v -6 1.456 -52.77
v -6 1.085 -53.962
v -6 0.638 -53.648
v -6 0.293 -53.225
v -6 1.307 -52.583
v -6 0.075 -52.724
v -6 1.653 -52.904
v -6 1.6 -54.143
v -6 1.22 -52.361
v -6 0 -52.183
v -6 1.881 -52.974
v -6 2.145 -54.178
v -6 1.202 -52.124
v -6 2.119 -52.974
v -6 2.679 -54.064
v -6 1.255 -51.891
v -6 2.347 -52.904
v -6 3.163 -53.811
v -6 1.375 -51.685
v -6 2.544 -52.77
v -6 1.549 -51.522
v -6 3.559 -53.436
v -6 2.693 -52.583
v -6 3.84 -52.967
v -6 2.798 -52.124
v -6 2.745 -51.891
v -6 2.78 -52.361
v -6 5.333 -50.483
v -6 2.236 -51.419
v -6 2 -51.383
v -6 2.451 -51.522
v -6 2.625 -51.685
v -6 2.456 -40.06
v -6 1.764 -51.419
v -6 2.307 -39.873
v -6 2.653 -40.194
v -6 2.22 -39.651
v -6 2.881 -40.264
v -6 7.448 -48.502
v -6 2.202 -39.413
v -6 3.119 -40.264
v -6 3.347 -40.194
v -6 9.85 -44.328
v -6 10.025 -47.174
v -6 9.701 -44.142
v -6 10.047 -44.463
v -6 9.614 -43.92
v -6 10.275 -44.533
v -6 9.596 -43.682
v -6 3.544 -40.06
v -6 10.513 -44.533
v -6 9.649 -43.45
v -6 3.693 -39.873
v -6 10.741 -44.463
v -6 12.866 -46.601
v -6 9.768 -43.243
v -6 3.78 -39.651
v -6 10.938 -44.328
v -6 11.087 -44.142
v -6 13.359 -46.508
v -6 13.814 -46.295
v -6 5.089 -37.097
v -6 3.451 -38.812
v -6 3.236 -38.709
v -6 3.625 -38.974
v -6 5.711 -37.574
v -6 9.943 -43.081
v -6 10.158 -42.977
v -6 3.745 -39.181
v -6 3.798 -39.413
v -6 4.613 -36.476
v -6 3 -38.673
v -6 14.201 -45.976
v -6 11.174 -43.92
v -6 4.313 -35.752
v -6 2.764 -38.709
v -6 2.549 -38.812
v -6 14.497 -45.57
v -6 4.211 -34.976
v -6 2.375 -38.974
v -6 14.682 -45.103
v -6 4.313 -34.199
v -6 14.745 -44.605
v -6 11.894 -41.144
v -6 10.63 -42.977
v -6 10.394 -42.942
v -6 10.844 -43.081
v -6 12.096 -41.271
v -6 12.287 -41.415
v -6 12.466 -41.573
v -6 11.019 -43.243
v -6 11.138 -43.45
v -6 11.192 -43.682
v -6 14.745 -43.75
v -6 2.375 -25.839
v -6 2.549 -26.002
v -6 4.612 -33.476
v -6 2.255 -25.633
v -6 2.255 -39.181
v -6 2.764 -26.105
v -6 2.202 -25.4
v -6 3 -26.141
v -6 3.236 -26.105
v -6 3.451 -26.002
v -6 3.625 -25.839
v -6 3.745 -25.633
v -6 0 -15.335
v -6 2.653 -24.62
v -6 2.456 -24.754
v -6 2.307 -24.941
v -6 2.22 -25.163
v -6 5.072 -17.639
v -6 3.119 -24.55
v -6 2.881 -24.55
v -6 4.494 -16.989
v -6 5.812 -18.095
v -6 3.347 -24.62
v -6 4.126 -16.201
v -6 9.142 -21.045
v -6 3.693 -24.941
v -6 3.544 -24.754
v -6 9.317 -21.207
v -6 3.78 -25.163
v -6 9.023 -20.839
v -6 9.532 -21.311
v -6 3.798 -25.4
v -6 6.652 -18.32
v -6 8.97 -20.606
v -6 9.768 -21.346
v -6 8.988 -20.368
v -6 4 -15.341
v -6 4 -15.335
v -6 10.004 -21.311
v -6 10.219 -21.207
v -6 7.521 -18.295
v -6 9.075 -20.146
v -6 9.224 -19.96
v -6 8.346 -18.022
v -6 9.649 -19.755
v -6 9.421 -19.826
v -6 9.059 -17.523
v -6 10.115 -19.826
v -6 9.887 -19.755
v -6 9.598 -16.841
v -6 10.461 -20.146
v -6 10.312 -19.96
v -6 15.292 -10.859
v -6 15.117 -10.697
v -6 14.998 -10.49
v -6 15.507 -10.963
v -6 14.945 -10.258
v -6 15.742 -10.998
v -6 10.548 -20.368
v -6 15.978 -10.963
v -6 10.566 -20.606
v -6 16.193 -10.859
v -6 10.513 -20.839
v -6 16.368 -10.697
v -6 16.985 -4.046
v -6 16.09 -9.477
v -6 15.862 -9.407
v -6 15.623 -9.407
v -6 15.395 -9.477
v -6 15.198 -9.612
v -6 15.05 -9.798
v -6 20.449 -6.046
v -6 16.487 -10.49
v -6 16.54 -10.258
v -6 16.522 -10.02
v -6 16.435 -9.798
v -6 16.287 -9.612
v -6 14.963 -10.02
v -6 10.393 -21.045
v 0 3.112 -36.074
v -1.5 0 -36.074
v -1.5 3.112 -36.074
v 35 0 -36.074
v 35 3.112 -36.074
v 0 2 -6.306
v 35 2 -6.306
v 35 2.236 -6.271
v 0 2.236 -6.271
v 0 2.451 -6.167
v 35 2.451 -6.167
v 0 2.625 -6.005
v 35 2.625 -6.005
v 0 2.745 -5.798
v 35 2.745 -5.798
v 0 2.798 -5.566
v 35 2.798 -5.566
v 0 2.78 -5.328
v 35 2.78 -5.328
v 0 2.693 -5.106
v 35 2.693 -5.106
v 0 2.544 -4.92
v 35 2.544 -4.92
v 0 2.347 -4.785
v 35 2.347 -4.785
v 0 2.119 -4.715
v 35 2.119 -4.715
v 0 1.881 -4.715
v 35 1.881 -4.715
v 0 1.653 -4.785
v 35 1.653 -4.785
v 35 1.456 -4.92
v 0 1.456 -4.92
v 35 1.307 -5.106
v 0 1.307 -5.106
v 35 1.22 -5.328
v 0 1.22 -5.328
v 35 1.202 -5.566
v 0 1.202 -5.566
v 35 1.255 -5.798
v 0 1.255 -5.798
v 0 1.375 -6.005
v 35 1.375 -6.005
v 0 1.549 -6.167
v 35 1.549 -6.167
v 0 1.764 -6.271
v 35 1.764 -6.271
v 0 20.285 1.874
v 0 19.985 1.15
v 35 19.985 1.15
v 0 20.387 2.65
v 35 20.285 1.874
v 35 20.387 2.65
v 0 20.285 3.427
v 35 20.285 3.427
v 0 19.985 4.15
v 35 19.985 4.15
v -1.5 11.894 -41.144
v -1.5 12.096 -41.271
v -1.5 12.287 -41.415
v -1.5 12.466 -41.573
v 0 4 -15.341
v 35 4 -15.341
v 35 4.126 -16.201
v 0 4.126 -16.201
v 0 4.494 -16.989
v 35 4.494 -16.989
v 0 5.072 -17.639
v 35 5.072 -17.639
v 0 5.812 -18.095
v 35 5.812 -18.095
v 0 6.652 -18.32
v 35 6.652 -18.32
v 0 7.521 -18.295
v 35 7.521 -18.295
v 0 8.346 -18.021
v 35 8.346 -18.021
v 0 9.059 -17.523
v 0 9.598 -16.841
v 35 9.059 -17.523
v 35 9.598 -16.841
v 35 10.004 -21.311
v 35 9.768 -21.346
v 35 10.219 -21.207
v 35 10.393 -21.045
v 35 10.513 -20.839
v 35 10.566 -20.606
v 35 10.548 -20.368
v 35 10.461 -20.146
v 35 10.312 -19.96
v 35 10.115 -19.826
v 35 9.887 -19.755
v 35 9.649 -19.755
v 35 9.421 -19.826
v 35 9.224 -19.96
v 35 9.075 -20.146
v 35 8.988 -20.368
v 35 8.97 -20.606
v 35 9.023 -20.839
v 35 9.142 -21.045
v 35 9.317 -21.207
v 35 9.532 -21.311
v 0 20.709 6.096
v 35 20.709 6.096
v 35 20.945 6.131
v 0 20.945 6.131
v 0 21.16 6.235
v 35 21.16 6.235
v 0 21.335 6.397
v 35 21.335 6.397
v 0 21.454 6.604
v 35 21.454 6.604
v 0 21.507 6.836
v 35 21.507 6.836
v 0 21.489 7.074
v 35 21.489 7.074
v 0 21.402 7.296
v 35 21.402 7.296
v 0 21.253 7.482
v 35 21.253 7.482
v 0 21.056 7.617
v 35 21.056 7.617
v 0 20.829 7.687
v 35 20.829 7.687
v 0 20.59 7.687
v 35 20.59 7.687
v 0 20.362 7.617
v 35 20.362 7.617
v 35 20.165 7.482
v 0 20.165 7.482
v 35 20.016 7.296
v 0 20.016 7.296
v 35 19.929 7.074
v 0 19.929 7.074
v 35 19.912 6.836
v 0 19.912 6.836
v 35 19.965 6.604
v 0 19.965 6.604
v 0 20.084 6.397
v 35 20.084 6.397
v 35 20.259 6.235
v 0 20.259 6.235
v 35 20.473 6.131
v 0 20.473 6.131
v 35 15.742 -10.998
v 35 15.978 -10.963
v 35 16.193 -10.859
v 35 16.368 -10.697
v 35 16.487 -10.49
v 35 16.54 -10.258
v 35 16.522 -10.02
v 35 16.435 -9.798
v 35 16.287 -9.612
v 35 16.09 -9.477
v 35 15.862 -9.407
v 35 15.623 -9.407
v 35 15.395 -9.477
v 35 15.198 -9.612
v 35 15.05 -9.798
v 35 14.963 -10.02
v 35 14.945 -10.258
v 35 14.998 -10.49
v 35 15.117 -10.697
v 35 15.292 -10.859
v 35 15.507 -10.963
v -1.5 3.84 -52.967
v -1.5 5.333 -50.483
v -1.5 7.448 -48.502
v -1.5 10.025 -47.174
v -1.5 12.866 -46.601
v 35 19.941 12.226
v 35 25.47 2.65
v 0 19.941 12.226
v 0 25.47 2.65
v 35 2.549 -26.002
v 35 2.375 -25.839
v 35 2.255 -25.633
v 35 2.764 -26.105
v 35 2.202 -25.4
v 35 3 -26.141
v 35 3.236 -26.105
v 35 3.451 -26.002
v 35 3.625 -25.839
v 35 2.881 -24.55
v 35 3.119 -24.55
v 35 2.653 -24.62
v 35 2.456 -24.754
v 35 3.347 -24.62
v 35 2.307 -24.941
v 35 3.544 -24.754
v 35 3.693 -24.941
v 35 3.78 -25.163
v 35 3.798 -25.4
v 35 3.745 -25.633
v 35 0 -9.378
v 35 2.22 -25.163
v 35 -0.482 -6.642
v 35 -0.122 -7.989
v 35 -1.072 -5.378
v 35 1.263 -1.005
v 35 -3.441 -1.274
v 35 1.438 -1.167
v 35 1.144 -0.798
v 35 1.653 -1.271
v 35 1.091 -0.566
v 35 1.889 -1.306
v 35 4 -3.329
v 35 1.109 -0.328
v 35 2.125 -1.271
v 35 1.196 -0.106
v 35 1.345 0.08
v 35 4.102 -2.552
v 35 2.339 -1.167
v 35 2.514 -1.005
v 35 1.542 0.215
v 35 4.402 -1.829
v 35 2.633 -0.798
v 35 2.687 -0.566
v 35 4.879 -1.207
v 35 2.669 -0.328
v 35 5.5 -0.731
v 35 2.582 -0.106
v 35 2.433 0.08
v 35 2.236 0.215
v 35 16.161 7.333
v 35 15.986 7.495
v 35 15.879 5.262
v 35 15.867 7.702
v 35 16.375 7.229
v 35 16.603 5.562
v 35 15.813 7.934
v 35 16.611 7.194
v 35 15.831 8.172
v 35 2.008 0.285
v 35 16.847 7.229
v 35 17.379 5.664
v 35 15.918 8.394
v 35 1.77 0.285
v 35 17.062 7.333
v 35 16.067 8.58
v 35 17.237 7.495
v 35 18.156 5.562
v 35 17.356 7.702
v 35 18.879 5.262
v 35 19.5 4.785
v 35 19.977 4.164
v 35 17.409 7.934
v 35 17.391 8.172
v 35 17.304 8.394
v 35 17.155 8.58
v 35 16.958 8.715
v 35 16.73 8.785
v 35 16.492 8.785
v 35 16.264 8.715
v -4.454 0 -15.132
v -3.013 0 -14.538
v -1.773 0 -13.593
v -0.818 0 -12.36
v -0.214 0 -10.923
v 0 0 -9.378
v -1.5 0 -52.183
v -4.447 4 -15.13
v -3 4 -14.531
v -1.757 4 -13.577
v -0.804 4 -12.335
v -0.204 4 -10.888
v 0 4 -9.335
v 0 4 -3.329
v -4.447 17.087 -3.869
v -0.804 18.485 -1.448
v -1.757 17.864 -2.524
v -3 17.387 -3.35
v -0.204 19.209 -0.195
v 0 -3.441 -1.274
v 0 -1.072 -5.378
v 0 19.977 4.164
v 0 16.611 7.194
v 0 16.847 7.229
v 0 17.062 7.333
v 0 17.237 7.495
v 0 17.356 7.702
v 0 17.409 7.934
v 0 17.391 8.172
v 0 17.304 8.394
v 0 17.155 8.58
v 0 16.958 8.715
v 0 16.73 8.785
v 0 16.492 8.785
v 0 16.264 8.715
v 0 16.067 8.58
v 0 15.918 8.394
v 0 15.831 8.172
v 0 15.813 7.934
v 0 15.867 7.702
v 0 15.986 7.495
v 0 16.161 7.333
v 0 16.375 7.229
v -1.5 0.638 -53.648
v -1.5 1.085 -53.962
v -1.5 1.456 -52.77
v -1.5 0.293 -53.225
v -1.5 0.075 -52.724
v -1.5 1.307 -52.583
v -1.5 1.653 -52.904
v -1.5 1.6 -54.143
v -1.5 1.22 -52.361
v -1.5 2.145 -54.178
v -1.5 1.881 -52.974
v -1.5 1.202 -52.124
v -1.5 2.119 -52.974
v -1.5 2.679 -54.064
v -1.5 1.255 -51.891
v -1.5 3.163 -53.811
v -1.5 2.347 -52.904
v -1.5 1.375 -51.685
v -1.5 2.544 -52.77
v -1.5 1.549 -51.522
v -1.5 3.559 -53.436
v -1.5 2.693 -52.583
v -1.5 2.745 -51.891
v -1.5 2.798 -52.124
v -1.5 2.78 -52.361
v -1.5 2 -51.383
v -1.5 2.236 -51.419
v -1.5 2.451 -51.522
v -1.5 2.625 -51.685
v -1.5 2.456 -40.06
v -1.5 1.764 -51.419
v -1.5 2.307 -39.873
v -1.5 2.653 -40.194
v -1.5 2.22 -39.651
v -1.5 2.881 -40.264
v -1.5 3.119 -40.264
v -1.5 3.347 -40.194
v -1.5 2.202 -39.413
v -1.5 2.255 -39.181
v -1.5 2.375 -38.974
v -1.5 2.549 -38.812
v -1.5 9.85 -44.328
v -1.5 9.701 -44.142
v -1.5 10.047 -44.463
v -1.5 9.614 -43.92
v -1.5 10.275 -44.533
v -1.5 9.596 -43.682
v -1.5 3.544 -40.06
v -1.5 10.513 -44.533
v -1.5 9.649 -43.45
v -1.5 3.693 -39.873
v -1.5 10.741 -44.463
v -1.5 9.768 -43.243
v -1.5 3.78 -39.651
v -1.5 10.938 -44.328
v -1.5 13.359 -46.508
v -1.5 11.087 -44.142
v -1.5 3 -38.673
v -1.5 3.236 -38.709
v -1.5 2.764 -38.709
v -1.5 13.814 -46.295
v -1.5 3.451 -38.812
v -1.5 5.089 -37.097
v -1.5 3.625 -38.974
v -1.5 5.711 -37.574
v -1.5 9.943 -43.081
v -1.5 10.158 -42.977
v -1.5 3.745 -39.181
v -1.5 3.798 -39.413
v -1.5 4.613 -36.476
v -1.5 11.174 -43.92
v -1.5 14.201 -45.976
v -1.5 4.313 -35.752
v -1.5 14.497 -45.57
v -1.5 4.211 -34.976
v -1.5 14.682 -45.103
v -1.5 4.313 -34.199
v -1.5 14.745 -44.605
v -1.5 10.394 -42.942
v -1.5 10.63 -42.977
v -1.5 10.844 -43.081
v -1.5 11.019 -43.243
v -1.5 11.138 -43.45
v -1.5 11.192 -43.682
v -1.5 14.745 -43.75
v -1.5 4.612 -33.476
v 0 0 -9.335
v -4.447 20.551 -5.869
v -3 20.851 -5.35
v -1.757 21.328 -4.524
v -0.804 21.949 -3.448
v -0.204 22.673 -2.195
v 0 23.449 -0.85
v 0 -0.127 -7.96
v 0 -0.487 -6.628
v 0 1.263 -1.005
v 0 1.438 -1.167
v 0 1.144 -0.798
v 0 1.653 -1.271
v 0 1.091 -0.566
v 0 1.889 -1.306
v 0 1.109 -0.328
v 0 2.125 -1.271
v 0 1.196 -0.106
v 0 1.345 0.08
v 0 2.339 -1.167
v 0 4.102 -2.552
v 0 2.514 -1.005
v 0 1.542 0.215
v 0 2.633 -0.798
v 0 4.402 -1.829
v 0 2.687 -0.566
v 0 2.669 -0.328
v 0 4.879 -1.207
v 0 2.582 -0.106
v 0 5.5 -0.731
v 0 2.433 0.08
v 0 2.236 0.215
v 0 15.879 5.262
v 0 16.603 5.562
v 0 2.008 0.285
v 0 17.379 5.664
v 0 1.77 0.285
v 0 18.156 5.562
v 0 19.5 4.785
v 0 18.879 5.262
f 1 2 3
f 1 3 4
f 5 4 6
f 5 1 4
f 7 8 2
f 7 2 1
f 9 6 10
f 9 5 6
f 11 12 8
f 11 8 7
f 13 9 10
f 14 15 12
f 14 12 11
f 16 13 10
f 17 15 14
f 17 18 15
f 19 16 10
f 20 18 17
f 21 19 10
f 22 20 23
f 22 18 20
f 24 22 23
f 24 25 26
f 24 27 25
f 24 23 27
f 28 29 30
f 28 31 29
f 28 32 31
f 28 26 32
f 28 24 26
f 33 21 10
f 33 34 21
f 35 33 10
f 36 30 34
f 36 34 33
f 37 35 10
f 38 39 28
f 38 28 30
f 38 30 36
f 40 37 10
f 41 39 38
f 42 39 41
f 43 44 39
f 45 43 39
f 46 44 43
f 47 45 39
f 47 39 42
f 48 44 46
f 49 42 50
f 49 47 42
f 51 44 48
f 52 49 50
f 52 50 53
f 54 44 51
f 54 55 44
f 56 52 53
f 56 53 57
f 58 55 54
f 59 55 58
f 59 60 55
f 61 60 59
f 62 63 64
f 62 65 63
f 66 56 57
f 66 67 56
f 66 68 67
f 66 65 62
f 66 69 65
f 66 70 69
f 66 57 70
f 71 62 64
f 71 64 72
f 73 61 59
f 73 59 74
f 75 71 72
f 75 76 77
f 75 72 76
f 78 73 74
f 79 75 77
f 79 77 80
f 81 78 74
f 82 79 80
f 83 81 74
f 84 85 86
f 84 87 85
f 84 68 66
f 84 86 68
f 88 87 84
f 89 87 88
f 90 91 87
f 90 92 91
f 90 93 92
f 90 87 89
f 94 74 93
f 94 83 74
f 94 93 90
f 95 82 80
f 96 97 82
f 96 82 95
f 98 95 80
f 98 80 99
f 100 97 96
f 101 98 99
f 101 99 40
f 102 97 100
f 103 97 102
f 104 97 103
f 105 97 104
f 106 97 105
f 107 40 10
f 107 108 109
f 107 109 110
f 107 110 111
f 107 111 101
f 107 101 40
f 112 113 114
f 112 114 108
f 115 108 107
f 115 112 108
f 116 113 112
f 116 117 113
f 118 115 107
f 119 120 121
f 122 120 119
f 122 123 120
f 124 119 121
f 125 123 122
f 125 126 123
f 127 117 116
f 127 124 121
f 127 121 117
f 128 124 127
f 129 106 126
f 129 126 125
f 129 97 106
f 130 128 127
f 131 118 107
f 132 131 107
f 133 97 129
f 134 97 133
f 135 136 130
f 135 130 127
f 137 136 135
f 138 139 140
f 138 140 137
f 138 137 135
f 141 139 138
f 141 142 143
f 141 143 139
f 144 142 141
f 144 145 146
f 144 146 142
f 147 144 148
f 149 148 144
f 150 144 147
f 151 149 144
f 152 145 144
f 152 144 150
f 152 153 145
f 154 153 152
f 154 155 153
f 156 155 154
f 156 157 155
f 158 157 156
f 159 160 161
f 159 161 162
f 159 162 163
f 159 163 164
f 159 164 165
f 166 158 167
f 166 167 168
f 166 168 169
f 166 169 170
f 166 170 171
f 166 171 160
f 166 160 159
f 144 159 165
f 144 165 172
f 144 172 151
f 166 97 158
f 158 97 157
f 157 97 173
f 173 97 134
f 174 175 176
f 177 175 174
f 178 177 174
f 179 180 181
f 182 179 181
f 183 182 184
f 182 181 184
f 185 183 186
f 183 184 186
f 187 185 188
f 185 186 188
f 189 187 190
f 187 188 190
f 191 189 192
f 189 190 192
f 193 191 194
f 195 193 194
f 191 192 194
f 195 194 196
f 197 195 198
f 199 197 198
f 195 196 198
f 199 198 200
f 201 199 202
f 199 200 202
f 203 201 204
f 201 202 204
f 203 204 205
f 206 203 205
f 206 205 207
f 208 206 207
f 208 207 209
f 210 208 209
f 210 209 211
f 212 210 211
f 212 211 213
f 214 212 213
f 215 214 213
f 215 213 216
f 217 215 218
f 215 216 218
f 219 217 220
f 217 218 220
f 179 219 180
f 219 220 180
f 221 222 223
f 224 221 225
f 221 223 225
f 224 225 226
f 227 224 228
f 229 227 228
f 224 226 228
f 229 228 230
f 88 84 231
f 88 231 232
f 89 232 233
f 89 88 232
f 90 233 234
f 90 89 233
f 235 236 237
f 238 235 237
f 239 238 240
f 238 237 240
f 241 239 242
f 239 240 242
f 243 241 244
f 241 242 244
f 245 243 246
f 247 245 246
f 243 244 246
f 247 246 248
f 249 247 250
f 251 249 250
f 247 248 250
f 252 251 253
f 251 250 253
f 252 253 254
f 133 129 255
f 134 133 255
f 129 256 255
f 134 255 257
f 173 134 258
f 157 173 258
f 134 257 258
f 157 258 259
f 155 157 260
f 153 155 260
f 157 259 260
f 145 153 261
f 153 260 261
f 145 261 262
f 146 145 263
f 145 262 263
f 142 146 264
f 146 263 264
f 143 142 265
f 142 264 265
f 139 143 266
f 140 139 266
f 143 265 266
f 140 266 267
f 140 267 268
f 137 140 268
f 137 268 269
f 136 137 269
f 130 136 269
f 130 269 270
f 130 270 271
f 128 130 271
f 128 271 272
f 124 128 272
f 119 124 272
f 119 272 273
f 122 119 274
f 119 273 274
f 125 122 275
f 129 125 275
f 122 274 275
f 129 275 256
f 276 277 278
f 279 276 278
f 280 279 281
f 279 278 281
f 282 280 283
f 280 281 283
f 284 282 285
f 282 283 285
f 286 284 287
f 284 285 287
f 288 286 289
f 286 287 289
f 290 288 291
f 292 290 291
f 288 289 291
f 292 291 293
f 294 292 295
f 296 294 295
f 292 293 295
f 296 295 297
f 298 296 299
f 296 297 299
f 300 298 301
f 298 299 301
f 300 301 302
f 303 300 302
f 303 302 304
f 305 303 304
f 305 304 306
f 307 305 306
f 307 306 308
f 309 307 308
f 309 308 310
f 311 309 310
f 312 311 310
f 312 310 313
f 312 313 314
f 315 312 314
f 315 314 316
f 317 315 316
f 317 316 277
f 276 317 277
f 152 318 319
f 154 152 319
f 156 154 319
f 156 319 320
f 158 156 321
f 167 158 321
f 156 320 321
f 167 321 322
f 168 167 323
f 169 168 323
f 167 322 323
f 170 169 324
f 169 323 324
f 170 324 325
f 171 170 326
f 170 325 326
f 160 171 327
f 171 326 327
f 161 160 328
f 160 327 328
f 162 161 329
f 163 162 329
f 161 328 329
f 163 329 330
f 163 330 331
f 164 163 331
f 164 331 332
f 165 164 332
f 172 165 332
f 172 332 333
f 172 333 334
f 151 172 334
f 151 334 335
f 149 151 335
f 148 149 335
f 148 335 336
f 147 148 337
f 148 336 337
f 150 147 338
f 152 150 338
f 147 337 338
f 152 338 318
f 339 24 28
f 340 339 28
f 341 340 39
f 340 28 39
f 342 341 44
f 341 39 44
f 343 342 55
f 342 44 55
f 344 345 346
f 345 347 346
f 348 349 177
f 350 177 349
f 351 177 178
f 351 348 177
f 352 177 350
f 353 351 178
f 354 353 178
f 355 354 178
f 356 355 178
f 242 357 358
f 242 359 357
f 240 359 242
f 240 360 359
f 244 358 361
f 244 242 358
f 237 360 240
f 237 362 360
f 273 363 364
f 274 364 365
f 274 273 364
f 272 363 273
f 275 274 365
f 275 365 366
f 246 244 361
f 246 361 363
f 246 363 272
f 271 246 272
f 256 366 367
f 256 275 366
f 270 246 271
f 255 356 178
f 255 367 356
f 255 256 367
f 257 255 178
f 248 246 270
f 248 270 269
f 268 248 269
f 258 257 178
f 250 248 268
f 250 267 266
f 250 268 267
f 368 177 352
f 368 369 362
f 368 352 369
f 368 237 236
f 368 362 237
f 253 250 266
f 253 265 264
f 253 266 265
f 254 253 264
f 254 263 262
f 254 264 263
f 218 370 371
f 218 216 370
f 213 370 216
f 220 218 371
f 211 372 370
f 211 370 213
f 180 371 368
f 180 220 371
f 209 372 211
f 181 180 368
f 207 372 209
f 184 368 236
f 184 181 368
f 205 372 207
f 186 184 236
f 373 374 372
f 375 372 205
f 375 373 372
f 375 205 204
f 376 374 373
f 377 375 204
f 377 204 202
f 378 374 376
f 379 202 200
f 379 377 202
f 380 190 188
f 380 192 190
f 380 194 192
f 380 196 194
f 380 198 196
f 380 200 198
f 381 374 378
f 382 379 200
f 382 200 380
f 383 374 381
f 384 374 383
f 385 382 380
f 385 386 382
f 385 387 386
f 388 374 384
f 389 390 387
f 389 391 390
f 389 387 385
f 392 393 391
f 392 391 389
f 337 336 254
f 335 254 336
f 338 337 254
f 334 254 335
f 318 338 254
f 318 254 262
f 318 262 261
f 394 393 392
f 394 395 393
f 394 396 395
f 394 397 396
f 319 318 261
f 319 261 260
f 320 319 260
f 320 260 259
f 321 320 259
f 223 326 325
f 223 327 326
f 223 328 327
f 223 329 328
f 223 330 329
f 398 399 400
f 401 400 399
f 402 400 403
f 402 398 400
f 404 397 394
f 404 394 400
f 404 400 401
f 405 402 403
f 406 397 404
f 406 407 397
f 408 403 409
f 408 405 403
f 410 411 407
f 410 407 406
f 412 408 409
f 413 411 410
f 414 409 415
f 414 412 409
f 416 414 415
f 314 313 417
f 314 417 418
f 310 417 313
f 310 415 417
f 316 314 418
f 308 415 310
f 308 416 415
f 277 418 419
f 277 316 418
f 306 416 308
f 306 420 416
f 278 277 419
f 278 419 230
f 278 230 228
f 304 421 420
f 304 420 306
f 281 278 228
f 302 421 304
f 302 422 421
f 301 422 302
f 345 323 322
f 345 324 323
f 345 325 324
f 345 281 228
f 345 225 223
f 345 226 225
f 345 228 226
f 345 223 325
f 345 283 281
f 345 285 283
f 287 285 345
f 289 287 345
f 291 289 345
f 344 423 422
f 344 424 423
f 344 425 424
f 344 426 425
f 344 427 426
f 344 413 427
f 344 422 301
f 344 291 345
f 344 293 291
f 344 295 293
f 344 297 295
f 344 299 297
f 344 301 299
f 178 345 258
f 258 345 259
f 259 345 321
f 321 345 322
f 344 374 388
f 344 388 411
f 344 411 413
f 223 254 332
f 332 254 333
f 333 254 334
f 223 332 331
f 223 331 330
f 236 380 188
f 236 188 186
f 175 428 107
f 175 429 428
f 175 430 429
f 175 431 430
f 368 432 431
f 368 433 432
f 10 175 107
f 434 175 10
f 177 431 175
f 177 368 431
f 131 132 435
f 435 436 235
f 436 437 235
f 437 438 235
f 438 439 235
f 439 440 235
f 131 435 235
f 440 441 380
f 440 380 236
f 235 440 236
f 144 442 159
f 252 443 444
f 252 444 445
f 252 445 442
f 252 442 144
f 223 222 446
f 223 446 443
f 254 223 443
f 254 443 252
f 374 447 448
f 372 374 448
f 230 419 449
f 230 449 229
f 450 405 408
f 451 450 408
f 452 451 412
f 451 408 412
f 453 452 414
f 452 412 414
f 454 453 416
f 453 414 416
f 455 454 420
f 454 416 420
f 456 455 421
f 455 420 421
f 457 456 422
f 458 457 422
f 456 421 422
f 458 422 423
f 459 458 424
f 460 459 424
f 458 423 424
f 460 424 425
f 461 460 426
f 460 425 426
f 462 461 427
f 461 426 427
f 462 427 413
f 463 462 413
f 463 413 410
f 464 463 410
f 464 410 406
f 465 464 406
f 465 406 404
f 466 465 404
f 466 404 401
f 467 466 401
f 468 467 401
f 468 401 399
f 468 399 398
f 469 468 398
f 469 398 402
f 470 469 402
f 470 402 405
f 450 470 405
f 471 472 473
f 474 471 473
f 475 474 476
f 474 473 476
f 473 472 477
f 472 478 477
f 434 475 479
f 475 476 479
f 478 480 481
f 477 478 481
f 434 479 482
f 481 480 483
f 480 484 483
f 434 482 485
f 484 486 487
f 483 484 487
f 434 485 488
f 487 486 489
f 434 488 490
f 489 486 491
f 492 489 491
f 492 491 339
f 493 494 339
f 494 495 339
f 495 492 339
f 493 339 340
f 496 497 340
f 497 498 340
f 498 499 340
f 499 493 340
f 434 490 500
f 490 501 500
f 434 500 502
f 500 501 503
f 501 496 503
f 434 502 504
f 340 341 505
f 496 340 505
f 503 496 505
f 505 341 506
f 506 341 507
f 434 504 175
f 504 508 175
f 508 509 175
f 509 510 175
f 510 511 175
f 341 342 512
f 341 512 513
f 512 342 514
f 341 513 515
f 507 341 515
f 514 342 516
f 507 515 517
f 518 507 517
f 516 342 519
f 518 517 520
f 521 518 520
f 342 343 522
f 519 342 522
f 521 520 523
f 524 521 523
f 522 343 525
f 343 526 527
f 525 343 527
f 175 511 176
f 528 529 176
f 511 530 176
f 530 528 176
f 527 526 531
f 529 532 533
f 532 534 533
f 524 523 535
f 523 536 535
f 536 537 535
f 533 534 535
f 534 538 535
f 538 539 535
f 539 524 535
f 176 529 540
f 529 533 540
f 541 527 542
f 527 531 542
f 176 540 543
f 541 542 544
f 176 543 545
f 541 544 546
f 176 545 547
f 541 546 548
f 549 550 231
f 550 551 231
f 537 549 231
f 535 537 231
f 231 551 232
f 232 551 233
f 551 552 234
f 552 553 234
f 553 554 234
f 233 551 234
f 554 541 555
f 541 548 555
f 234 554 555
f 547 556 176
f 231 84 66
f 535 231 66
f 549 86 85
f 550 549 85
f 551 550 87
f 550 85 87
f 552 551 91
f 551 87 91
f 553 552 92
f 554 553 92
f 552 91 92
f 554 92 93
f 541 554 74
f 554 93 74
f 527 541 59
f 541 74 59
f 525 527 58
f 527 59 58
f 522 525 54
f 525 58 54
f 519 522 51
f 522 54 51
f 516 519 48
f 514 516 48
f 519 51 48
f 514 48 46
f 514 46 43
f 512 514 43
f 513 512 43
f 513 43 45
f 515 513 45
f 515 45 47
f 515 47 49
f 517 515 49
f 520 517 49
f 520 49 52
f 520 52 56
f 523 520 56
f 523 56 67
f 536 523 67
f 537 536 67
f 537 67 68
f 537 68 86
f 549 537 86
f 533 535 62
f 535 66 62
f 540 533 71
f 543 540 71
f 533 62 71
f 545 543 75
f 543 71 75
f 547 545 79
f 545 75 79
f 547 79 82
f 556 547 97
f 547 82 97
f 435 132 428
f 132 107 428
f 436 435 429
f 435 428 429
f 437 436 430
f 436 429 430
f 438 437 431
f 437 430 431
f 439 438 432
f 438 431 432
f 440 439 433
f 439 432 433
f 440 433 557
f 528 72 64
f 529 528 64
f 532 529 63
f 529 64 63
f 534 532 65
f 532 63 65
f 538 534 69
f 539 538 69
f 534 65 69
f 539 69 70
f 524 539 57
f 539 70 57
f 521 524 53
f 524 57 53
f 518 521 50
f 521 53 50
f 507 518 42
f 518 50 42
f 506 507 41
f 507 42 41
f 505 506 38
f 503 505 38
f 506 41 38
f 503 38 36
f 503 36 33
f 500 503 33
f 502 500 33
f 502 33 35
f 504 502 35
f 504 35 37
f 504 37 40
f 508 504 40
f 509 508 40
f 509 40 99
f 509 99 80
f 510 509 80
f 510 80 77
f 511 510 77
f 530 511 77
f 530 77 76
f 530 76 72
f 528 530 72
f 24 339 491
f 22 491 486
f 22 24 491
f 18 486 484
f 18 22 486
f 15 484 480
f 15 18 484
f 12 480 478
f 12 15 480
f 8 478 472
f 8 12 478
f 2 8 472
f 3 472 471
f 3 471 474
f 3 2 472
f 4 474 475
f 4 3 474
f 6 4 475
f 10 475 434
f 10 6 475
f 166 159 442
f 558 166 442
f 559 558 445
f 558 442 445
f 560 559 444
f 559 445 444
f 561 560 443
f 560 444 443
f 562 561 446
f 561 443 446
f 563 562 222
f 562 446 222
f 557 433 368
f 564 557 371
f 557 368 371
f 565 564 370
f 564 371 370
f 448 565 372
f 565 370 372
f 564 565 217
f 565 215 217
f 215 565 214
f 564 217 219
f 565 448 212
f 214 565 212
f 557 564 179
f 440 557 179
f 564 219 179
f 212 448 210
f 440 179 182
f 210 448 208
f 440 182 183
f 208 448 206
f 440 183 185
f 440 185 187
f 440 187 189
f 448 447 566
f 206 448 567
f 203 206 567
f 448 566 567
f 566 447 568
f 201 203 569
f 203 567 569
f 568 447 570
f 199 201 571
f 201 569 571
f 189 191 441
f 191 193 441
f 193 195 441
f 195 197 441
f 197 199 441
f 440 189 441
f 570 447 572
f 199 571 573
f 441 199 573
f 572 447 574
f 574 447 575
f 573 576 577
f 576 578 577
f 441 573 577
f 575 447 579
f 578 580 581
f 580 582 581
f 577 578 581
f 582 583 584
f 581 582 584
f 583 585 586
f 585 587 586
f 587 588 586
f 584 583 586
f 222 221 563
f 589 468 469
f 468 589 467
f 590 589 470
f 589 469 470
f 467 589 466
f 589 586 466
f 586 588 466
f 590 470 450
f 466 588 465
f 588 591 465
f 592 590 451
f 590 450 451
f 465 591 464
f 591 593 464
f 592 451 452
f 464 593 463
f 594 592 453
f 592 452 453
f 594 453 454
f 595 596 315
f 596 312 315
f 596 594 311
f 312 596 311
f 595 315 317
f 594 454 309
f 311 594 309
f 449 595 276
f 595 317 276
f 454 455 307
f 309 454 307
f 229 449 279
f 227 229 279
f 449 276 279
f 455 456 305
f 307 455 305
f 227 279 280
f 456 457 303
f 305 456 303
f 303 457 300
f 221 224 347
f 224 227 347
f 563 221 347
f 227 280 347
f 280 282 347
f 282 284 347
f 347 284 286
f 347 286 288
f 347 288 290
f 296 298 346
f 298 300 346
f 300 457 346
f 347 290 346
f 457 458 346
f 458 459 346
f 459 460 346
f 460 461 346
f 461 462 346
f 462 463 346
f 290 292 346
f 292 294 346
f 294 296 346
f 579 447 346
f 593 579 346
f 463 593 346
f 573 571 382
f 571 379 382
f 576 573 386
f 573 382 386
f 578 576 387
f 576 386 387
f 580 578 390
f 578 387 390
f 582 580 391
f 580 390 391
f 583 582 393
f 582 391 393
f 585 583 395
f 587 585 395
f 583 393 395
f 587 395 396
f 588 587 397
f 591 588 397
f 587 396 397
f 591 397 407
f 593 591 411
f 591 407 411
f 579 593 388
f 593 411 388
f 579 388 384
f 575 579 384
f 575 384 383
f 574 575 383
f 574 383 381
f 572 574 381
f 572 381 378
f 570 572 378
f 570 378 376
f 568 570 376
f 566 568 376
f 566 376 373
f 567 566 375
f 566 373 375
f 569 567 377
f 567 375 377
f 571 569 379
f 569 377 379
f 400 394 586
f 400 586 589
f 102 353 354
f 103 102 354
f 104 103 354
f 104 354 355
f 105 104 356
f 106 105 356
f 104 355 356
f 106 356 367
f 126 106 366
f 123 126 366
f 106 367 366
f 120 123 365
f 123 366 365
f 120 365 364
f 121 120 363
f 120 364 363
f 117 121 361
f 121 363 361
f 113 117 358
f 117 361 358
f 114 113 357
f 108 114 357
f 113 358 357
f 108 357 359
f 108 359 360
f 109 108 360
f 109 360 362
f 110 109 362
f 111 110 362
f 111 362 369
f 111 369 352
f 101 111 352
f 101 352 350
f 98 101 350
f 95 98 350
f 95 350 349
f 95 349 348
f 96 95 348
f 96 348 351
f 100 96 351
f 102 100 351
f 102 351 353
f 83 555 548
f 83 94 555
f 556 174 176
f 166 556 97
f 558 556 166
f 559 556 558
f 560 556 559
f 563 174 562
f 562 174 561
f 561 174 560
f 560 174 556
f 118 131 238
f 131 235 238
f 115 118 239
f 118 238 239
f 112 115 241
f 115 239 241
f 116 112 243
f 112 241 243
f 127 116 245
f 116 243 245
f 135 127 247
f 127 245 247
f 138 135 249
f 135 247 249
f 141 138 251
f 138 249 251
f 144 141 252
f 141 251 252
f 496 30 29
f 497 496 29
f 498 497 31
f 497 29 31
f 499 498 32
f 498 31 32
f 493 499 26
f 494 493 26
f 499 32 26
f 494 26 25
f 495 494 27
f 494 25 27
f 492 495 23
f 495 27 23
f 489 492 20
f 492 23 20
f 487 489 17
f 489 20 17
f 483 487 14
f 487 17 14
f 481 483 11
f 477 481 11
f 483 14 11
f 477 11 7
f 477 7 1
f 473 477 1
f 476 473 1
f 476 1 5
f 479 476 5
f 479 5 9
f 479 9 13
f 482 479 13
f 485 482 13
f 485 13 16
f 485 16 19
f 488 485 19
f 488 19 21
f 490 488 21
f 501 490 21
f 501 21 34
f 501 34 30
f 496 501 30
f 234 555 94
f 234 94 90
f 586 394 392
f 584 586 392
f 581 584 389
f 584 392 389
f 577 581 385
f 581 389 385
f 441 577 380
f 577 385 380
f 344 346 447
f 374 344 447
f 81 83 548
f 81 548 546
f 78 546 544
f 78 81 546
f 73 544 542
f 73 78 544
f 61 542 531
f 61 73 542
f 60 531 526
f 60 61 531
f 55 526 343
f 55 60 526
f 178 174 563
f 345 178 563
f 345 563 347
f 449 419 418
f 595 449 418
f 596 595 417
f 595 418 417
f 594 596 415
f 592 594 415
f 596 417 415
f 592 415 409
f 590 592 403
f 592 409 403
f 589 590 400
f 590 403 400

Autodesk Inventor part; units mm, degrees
ref_plane "YZ Plane" through (0, 0, 0) normal (1, 0, 0) x (0, 1, 0)
ref_plane "XZ Plane" through (0, 0, 0) normal (0, 1, 0) x (-1, 0, 0)
sketch "スケッチ1" plane through (0, 0, 0) normal (1, 0, 0) x (0, 1, 0)
  line L0 (27, 0) -> (0, 0)
  line L1 (0, 0) -> (0, -65.8723)
  line L2 (0, -65.8723) -> (27, -65.8723)
  line L3 (27, -65.8723) -> (27, -2.1436)
  line L4 (25.9282, 1.8564) -> (7.2963, 34.1277)
  line L5 (7.2963, 34.1277) -> (-16.0863, 20.6277)
  line L6 (-16.0863, 20.6277) -> (0, -7.2346)
  line L7 (0, 19.7654) -> (-4.395, 27.3777)
  circle A0 centre (0, 19.7654) radius 4.25
  circle A1 centre (13.5, -57.0823) radius 4.25
  line L8 (13.5, -65.8723) -> (13.5, -57.0823)
  circle A2 centre (0, 19.7654) radius 13.5
  circle A3 centre (13.5, -57.0823) radius 13.5
  circle A4 centre (0, 19.7654) radius 6
  circle A5 centre (13.5, -57.0823) radius 6
  circle A6 centre (-3, 24.9615) radius 1
  circle A7 centre (-5.7956, 21.3183) radius 1
  circle A8 centre (-5.1962, 16.7654) radius 1
  circle A9 centre (-1.5529, 13.9698) radius 1
  circle A10 centre (3, 14.5692) radius 1
  circle A11 centre (5.7956, 18.2125) radius 1
  circle A12 centre (13.5, -63.0823) radius 1
  circle A13 centre (17.7426, -61.3249) radius 1
  circle A14 centre (19.5, -57.0823) radius 1
  circle A15 centre (17.7426, -52.8396) radius 1
  circle A16 centre (13.5, -51.0823) radius 1
  circle A17 centre (9.2574, -52.8396) radius 1
  circle A18 centre (7.5, -57.0823) radius 1
  circle A19 centre (9.2574, -61.3249) radius 1
  circle A20 centre (5.1962, 22.7654) radius 1
  circle A21 centre (1.5529, 25.5609) radius 1
  line L9 (13.5, -57.0823) -> (50.1936, 6.4729)
  line L10 (13.5, -57.0823) -> (5.7058, -52.5823)
  line L11 (12.2058, -41.3239) -> (-0.7942, -63.8406)
  line L12 (12.2058, -41.3239) -> (3.1125, -36.0739)
  line L13 (3.1125, -36.0739) -> (27, 5.3004)
  line L14 (19.9413, 12.226) -> (-3.4413, -1.274)
  line L15 (3.1125, -36.0739) -> (0, -36.0739)
  arc A22 (27, -2.1436) -> (25.9282, 1.8564) centre (19, -2.1436) ccw
  point P0 (-14.7211, 28.9596)
  point P1 (-3.0298, -41.1381)
  point P2 (23.9702, -41.1381)
  point P3 (8.6616, 42.4596)
  point P4 (25.4699, 2.6502)
  point P5 (0, -57.0823)
  point P6 (10.7369, -43.8681)
  dimension "d11" = 12
  dimension "d12" = 12
  dimension "d4" = 27
  dimension "d5" = 150
  dimension "d6" = 27
  dimension "d7" = 8.79
  dimension "d8" = 100
  dimension "d9" = 8.79
  dimension "d10" = 8.5
  dimension "d13" = 2
  dimension "d14" = 360
  dimension "d15" = 2
  dimension "d16" = 360
  dimension "d17" = 39.4073
  dimension "d18" = 9
  dimension "d19" = 13
  dimension "d20" = 30
  dimension "d22" = 19.5
  dimension "d24" = 16.5
  dimension "d28" = 8
extrude "押し出し1" add sketch "スケッチ1" along normal blind 35 contours L13 L15 L1 L0 | L0 L1 L6 L14 L4 L13
fillet "フィレット1" radius 8 1 edges at (17.5, 0, -7.2346)
sketch "スケッチ2" plane through (35, 0, 0) normal (1, 0, 0) x (0, 0, -1)
  line L0 (21.5464, 11.5) -> (9.5919, 18.4019) projected
  arc A0 (11.0919, 24) -> (9.5919, 18.4019) centre (11.0919, 21) ccw projected
  line L1 (11.0919, 24) -> (27.0312, 24) projected
  arc A1 (29.6293, 19.5) -> (27.0312, 24) centre (27.0312, 21) ccw projected
  line L2 (29.6293, 19.5) -> (25.6444, 12.5981) projected
  arc A2 (21.5464, 11.5) -> (25.6444, 12.5981) centre (23.0464, 14.0981) ccw projected
  line L3 (-15.2943, 14.7058) -> (-13.324, 15.8433) projected
  arc A3 (-9.226, 14.7452) -> (-13.324, 15.8433) centre (-11.824, 13.2452) ccw projected
  line L4 (-9.226, 14.7452) -> (-1.726, 1.7548) projected
  arc A4 (-2.824, -2.3433) -> (-1.726, 1.7548) centre (-4.324, 0.2548) ccw projected
  line L5 (-2.824, -2.3433) -> (-4.7943, -3.4808) projected
  arc A5 (-9.2878, -0.6865) -> (-4.7943, -3.4808) centre (-6.2943, -0.8827) ccw projected
  arc A6 (-9.2878, -0.6865) -> (-15.1212, 9.4171) centre (-19.7654, 0) ccw projected
  arc A7 (-15.2943, 14.7058) -> (-15.1212, 9.4171) centre (-13.7943, 12.1077) ccw projected
  line L6 (45.8573, 3) -> (37.0726, 3) projected
  arc A8 (35.5726, 3.4019) -> (37.0726, 3) centre (37.0726, 6) ccw projected
  line L7 (35.5726, 3.4019) -> (31.9387, 5.5) projected
  arc A9 (30.8406, 9.5981) -> (31.9387, 5.5) centre (33.4387, 8.0981) ccw projected
  line L8 (30.8406, 9.5981) -> (38.2895, 22.5) projected
  arc A10 (40.8876, 24) -> (38.2895, 22.5) centre (40.8876, 21) ccw projected
  line L9 (40.8876, 24) -> (45.8573, 24) projected
  arc A11 (48.3517, 19.3333) -> (45.8573, 24) centre (45.8573, 21) ccw projected
  arc A12 (48.3517, 19.3333) -> (48.3517, 7.6667) centre (57.0823, 13.5) ccw projected
  arc A13 (45.8573, 3) -> (48.3517, 7.6667) centre (45.8573, 6) ccw projected
  line L10 (-1.1502, 19.9851) -> (16.8406, 9.5981) projected
  arc A14 (15.3406, 4) -> (16.8406, 9.5981) centre (15.3406, 7) ccw projected
  line L11 (15.3406, 4) -> (3.3286, 4) projected
  arc A15 (0.7306, 5.5) -> (3.3286, 4) centre (3.3286, 7) ccw projected
  line L12 (0.7306, 5.5) -> (-5.2619, 15.8792) projected
  arc A16 (-4.1638, 19.9772) -> (-5.2619, 15.8792) centre (-2.6638, 17.3792) ccw projected
  line L13 (-4.1638, 19.9772) -> (-4.1502, 19.9851) projected
  arc A17 (-1.1502, 19.9851) -> (-4.1502, 19.9851) centre (-2.6502, 17.387) ccw projected
  arc A18 (57.3667, 17.7405) -> (59.3483, 18.9706) centre (57.5005, 19.736) ccw projected
  line L14 (59.3483, 18.9706) -> (59.8105, 20.0866) projected
  arc A19 (59.8105, 20.0866) -> (55.1911, 27) centre (55.1911, 22) ccw projected
  line L15 (55.1911, 27) -> (2.1436, 27) projected
  arc A20 (2.1436, 27) -> (-1.8564, 25.9282) centre (2.1436, 19) ccw projected
  line L16 (-1.8564, 25.9282) -> (-24.8776, 12.6369) projected
  arc A21 (-24.8776, 12.6369) -> (-25.4214, 4.34) centre (-22.3776, 8.3068) ccw projected
  line L17 (-25.4214, 4.34) -> (-24.4631, 3.6047) projected
  arc A22 (-24.4631, 3.6047) -> (-22.1319, 3.5302) centre (-23.2456, 5.1914) ccw projected
  arc A23 (-17.8914, -3.8146) -> (-22.1319, 3.5302) centre (-19.7654, 0) ccw projected
  arc A24 (-17.8914, -3.8146) -> (-18.9925, -5.8707) centre (-17.0096, -5.6096) ccw projected
  line L18 (-18.9925, -5.8707) -> (-18.8348, -7.0683) projected
  arc A25 (-18.8348, -7.0683) -> (-11.3776, -10.7458) centre (-13.8776, -6.4156) ccw projected
  line L19 (-11.3776, -10.7458) -> (5.3782, -1.0718) projected
  arc A26 (9.3782, 0) -> (5.3782, -1.0718) centre (9.3782, -8) ccw projected
  line L20 (9.3782, 0) -> (55.1911, 0) projected
  arc A27 (55.1911, 0) -> (59.8105, 6.9134) centre (55.1911, 5) ccw projected
  line L21 (59.8105, 6.9134) -> (59.3483, 8.0294) projected
  arc A28 (59.3483, 8.0294) -> (57.3667, 9.2595) centre (57.5005, 7.264) ccw projected
  arc A29 (57.3667, 17.7405) -> (57.3667, 9.2595) centre (57.0823, 13.5) ccw projected
  circle A30 centre (-22.7654, 5.1962) radius 1 projected
  circle A31 centre (-18.2125, 5.7956) radius 1 projected
  circle A32 centre (-14.5692, 3) radius 1 projected
  circle A33 centre (-13.9698, -1.5529) radius 1 projected
  circle A34 centre (-16.7654, -5.1962) radius 1 projected
  circle A35 centre (57.0823, 19.5) radius 1 projected
  circle A36 centre (52.8396, 17.7426) radius 1 projected
  circle A37 centre (51.0823, 13.5) radius 1 projected
  circle A38 centre (52.8396, 9.2574) radius 1 projected
  circle A39 centre (57.0823, 7.5) radius 1 projected
  circle A40 centre (5.5061, 2) radius 1 projected
  circle A41 centre (10.1981, 15.7425) radius 1 projected
  circle A42 centre (25.3406, 3) radius 1 projected
  circle A43 centre (0.5061, 1.8888) radius 1 projected
  circle A44 centre (20.5464, 9.7679) radius 1 projected
  circle A45 centre (-7.9939, 16.6112) radius 1 projected
  circle A46 centre (-6.8958, 20.7093) radius 1 projected
  point P0 (0, 0)
extrude "押し出し2" cut sketch "スケッチ2" against normal through all contours L10 A14 L11 A15 L12 A16 L13 A17
sketch "スケッチ3" plane through (0, 0, 0) normal (-1, 0, 0) x (0, 0, 1)
  arc A0 (-3.3286, 4) -> (-0.7306, 5.5) centre (-3.3286, 7) ccw projected
  line L0 (-3.3286, 4) -> (-15.3406, 4) projected
  arc A1 (-16.8406, 9.5981) -> (-15.3406, 4) centre (-15.3406, 7) ccw projected
  line L1 (-16.8406, 9.5981) -> (1.1502, 19.9851) projected
  arc A2 (4.1502, 19.9851) -> (1.1502, 19.9851) centre (2.6502, 17.387) ccw projected
  line L2 (4.1502, 19.9851) -> (4.1638, 19.9772) projected
  arc A3 (5.2619, 15.8792) -> (4.1638, 19.9772) centre (2.6638, 17.3792) ccw projected
  line L3 (5.2619, 15.8792) -> (-0.7306, 5.5) projected
  line L4 (-36.0739, 3.1125) -> (2.6502, 25.4699) projected
  line L5 (-36.0739, 0) -> (-36.0739, 3.1125) projected
  line L6 (-9.3782, 0) -> (-36.0739, 0) projected
  arc A4 (-5.3782, -1.0718) -> (-9.3782, 0) centre (-9.3782, -8) ccw projected
  line L7 (-1.274, -3.4413) -> (-5.3782, -1.0718) projected
  line L8 (12.226, 19.9413) -> (-1.274, -3.4413) projected
  line L9 (2.6502, 25.4699) -> (12.226, 19.9413) projected
  line L10 (1.1502, 19.9851) -> (-0.8498, 23.4492)
  line L11 (-6.0459, 20.4492) -> (-4.0459, 16.9851)
  line L12 (-15.3346, 4) -> (-15.3346, 0)
  line L13 (-3.3286, 4) -> (-15.3406, 4) projected
  line L14 (-9.3782, 0) -> (-9.3782, 4)
  point P0 (0, 0)
  point P1 (-9.3346, 4)
  dimension "d33" = 6
  dimension "d34" = 6
extrude "押し出し3" add sketch "スケッチ3" along normal blind 6 contours L12 L6 L5 L4 L11 L1 A1 L0
fillet "フィレット2" radius 6 2 edges at (0, 18.7171, -5.0459) (0, 2, -15.3346)
sketch "スケッチ4" plane through (-6, 0, 0) normal (-1, 0, 0) x (0, 0, 1)
  arc A0 (-39.4731, 0) -> (-36.875, 4.5) centre (-39.4731, 3) ccw projected
  line L0 (-39.4731, 0) -> (-55.1911, 0) projected
  arc A1 (-59.8105, 6.9134) -> (-55.1911, 0) centre (-55.1911, 5) ccw projected
  line L1 (-59.8105, 6.9134) -> (-59.3483, 8.0294) projected
  arc A2 (-57.3667, 9.2595) -> (-59.3483, 8.0294) centre (-57.5005, 7.264) ccw projected
  arc A3 (-57.3667, 9.2595) -> (-57.3667, 17.7405) centre (-57.0823, 13.5) ccw projected
  arc A4 (-59.3483, 18.9706) -> (-57.3667, 17.7405) centre (-57.5005, 19.736) ccw projected
  line L2 (-59.3483, 18.9706) -> (-59.7128, 19.8506) projected
  arc A5 (-56.8847, 23.9981) -> (-59.7128, 19.8506) centre (-56.9411, 20.9987) ccw projected
  arc A6 (-49.4902, 20.7534) -> (-56.8847, 23.9981) centre (-57.0823, 13.5) ccw projected
  line L3 (-49.4902, 20.7534) -> (-41.5728, 12.4662) projected
  arc A7 (-41.1438, 11.8938) -> (-41.5728, 12.4662) centre (-43.7419, 10.3938) ccw projected
  line L4 (-41.1438, 11.8938) -> (-36.875, 4.5) projected
  circle A8 centre (-57.0823, 19.5) radius 1 projected
  circle A9 centre (-52.8396, 17.7426) radius 1 projected
  circle A10 centre (-51.0823, 13.5) radius 1 projected
  circle A11 centre (-52.8396, 9.2574) radius 1 projected
  circle A12 centre (-57.0823, 7.5) radius 1 projected
  circle A13 centre (-57.0823, 13.5) radius 10.5
  arc A14 (-50.4826, 5.3333) -> (-46.6014, 12.8657) centre (-57.0823, 13.5) ccw projected
  arc A15 (-44.6051, 14.7449) -> (-46.6014, 12.8657) centre (-44.6051, 12.7449) ccw projected
  arc A16 (-52.9671, 3.84) -> (-46.6014, 12.8657) centre (-57.0823, 13.5) ccw projected
  arc A17 (-52.9671, 3.84) -> (-52.1833, 0) centre (-52.1833, 2) ccw projected
  line L5 (-15.3782, 0) -> (-52.1833, 0) projected
  line L6 (-15.3782, 0) -> (-15.3782, 4.0002) projected
  arc A18 (-16.8406, 9.5981) -> (-15.3782, 4.0002) centre (-15.3406, 7) ccw projected
  line L7 (-16.8406, 9.5981) -> (-4.0459, 16.9851) projected
  line L8 (-4.0459, 16.9851) -> (-6.0459, 20.4492) projected
  line L9 (-6.0459, 20.4492) -> (-15.926, 14.7449) projected
  line L10 (-15.926, 14.7449) -> (-44.6051, 14.7449) projected
  line L11 (-36.3155, 12.5308) -> (-30.9571, 12.5308) projected
  arc A19 (-29.4571, 6.9328) -> (-30.9571, 12.5308) centre (-30.9571, 9.5308) ccw projected
  line L12 (-29.4571, 6.9328) -> (-33.4759, 4.6125) projected
  arc A20 (-37.5739, 5.7106) -> (-33.4759, 4.6125) centre (-34.9759, 7.2106) ccw projected
  line L13 (-37.5739, 5.7106) -> (-38.9135, 8.0308) projected
  arc A21 (-36.3155, 12.5308) -> (-38.9135, 8.0308) centre (-36.3155, 9.5308) ccw projected
  arc A22 (-44.6051, 14.7449) -> (-46.6014, 12.8657) centre (-44.6051, 12.7449) ccw projected
  arc A23 (-52.9671, 3.84) -> (-46.6014, 12.8657) centre (-57.0823, 13.5) ccw projected
  arc A24 (-52.9671, 3.84) -> (-52.1833, 0) centre (-52.1833, 2) ccw projected
  line L14 (-15.3782, 0) -> (-52.1833, 0) projected
  line L15 (-15.3782, 0) -> (-15.3782, 4.0002) projected
  arc A25 (-16.8406, 9.5981) -> (-15.3782, 4.0002) centre (-15.3406, 7) ccw projected
  line L16 (-16.8406, 9.5981) -> (-4.0459, 16.9851) projected
  line L17 (-4.0459, 16.9851) -> (-6.0459, 20.4492) projected
  line L18 (-6.0459, 20.4492) -> (-15.926, 14.7449) projected
  line L19 (-15.926, 14.7449) -> (-44.6051, 14.7449) projected
  line L20 (-36.3155, 12.5308) -> (-30.9571, 12.5308) projected
  arc A26 (-29.4571, 6.9328) -> (-30.9571, 12.5308) centre (-30.9571, 9.5308) ccw projected
  line L21 (-29.4571, 6.9328) -> (-33.4759, 4.6125) projected
  arc A27 (-37.5739, 5.7106) -> (-33.4759, 4.6125) centre (-34.9759, 7.2106) ccw projected
  line L22 (-37.5739, 5.7106) -> (-38.9135, 8.0308) projected
  arc A28 (-36.3155, 12.5308) -> (-38.9135, 8.0308) centre (-36.3155, 9.5308) ccw projected
  line L23 (-6.0459, 20.4492) -> (-36.0739, 3.1125) projected
  line L24 (-36.0739, 3.1125) -> (-36.0739, 0) projected
  circle A29 centre (-52.1833, 2) radius 1 projected
  circle A30 centre (-39.4731, 3) radius 1 projected
  circle A31 centre (-43.7419, 10.3938) radius 1 projected
  circle A32 centre (-10.1981, 15.7425) radius 1 projected
  circle A33 centre (-20.5464, 9.7679) radius 1 projected
  circle A34 centre (-25.3406, 3) radius 1 projected
  circle A35 centre (-52.1833, 2) radius 1 projected
  circle A36 centre (-39.4731, 3) radius 1 projected
  circle A37 centre (-43.7419, 10.3938) radius 1 projected
  circle A38 centre (-10.1981, 15.7425) radius 1 projected
  circle A39 centre (-20.5464, 9.7679) radius 1 projected
  circle A40 centre (-25.3406, 3) radius 1 projected
  point P0 (-48.6288, 19.8517)
  point P1 (-56.8847, 23.9981)
  point P2 (-59.9256, 3.3923)
  point P3 (-56.8847, 23.9981)
  point P4 (-43.7498, 14.7449)
  point P5 (-46.6012, 12.8697)
  point P6 (-52.9703, 3.8386)
  point P7 (-37.5718, 5.7069)
  point P8 (-39.4697, 0)
ref_plane "作業平面1" through (-1.5, -10.2702, -70.5828) normal (-1, 0, 0) x (0, 0, 1)
extrude "押し出し4" add sketch "スケッチ4" against normal up to surface (4.5 mm away) contours L0 A17 A13 A15 L10 L3 A7 L4 A0 | A0 L4 A20 L23 L24 L5 | A29 | A30 | A31
sketch "スケッチ5" plane through (35, 0, 0) normal (1, 0, 0) x (0, 0, -1)
  line L0 (36.0739, 3.1125) -> (-2.6502, 25.4699) projected
  circle A0 centre (5.5061, 2) radius 1 construction
  circle A1 centre (10.1981, 15.7425) radius 1 construction
  circle A2 centre (25.3406, 3) radius 1 construction
  circle A3 centre (0.5061, 1.8888) radius 1 construction
  circle A4 centre (20.5464, 9.7679) radius 1 construction
  circle A5 centre (-7.9939, 16.6112) radius 1 construction
  circle A6 centre (-6.8958, 20.7093) radius 1 construction
  line L1 (21.5464, 11.5) -> (9.5919, 18.4019) projected
  arc A7 (11.0919, 24) -> (9.5919, 18.4019) centre (11.0919, 21) ccw projected
  line L2 (11.0919, 24) -> (27.0312, 24) projected
  arc A8 (29.6293, 19.5) -> (27.0312, 24) centre (27.0312, 21) ccw projected
  line L3 (29.6293, 19.5) -> (25.6444, 12.5981) projected
  arc A9 (21.5464, 11.5) -> (25.6444, 12.5981) centre (23.0464, 14.0981) ccw projected
  line L4 (-15.2943, 14.7058) -> (-13.324, 15.8433) projected
  arc A10 (-9.226, 14.7452) -> (-13.324, 15.8433) centre (-11.824, 13.2452) ccw projected
  line L5 (-9.226, 14.7452) -> (-1.726, 1.7548) projected
  arc A11 (-2.824, -2.3433) -> (-1.726, 1.7548) centre (-4.324, 0.2548) ccw projected
  line L6 (-2.824, -2.3433) -> (-4.7943, -3.4808) projected
  arc A12 (-9.2878, -0.6865) -> (-4.7943, -3.4808) centre (-6.2943, -0.8827) ccw projected
  arc A13 (-9.2878, -0.6865) -> (-15.1212, 9.4171) centre (-19.7654, 0) ccw projected
  arc A14 (-15.2943, 14.7058) -> (-15.1212, 9.4171) centre (-13.7943, 12.1077) ccw projected
  line L7 (45.8573, 3) -> (37.0726, 3) projected
  arc A15 (35.5726, 3.4019) -> (37.0726, 3) centre (37.0726, 6) ccw projected
  line L8 (35.5726, 3.4019) -> (31.9387, 5.5) projected
  arc A16 (30.8406, 9.5981) -> (31.9387, 5.5) centre (33.4387, 8.0981) ccw projected
  line L9 (30.8406, 9.5981) -> (38.2895, 22.5) projected
  arc A17 (40.8876, 24) -> (38.2895, 22.5) centre (40.8876, 21) ccw projected
  line L10 (40.8876, 24) -> (45.8573, 24) projected
  arc A18 (48.3517, 19.3333) -> (45.8573, 24) centre (45.8573, 21) ccw projected
  arc A19 (48.3517, 19.3333) -> (48.3517, 7.6667) centre (57.0823, 13.5) ccw projected
  arc A20 (45.8573, 3) -> (48.3517, 7.6667) centre (45.8573, 6) ccw projected
  line L11 (-1.1502, 19.9851) -> (16.8406, 9.5981) projected
  arc A21 (15.3406, 4) -> (16.8406, 9.5981) centre (15.3406, 7) ccw projected
  line L12 (15.3406, 4) -> (3.3286, 4) projected
  arc A22 (0.7306, 5.5) -> (3.3286, 4) centre (3.3286, 7) ccw projected
  line L13 (0.7306, 5.5) -> (-5.2619, 15.8792) projected
  arc A23 (-4.1638, 19.9772) -> (-5.2619, 15.8792) centre (-2.6638, 17.3792) ccw projected
  line L14 (-4.1638, 19.9772) -> (-4.1502, 19.9851) projected
  arc A24 (-1.1502, 19.9851) -> (-4.1502, 19.9851) centre (-2.6502, 17.387) ccw projected
  arc A25 (57.3667, 17.7405) -> (59.3483, 18.9706) centre (57.5005, 19.736) ccw projected
  line L15 (59.3483, 18.9706) -> (59.8105, 20.0866) projected
  arc A26 (59.8105, 20.0866) -> (55.1911, 27) centre (55.1911, 22) ccw projected
  line L16 (55.1911, 27) -> (2.1436, 27) projected
  arc A27 (2.1436, 27) -> (-1.8564, 25.9282) centre (2.1436, 19) ccw projected
  line L17 (-1.8564, 25.9282) -> (-24.8776, 12.6369) projected
  arc A28 (-24.8776, 12.6369) -> (-25.4214, 4.34) centre (-22.3776, 8.3068) ccw projected
  line L18 (-25.4214, 4.34) -> (-24.4631, 3.6047) projected
  arc A29 (-24.4631, 3.6047) -> (-22.1319, 3.5302) centre (-23.2456, 5.1914) ccw projected
  arc A30 (-17.8914, -3.8146) -> (-22.1319, 3.5302) centre (-19.7654, 0) ccw projected
  arc A31 (-17.8914, -3.8146) -> (-18.9925, -5.8707) centre (-17.0096, -5.6096) ccw projected
  line L19 (-18.9925, -5.8707) -> (-18.8348, -7.0683) projected
  arc A32 (-18.8348, -7.0683) -> (-11.3776, -10.7458) centre (-13.8776, -6.4156) ccw projected
  line L20 (-11.3776, -10.7458) -> (5.3782, -1.0718) projected
  arc A33 (9.3782, 0) -> (5.3782, -1.0718) centre (9.3782, -8) ccw projected
  line L21 (9.3782, 0) -> (55.1911, 0) projected
  arc A34 (55.1911, 0) -> (59.8105, 6.9134) centre (55.1911, 5) ccw projected
  line L22 (59.8105, 6.9134) -> (59.3483, 8.0294) projected
  arc A35 (59.3483, 8.0294) -> (57.3667, 9.2595) centre (57.5005, 7.264) ccw projected
  arc A36 (57.3667, 17.7405) -> (57.3667, 9.2595) centre (57.0823, 13.5) ccw projected
  circle A37 centre (-22.7654, 5.1962) radius 1 projected
  circle A38 centre (-18.2125, 5.7956) radius 1 projected
  circle A39 centre (-14.5692, 3) radius 1 projected
  circle A40 centre (-13.9698, -1.5529) radius 1 projected
  circle A41 centre (-16.7654, -5.1962) radius 1 projected
  circle A42 centre (57.0823, 19.5) radius 1 projected
  circle A43 centre (52.8396, 17.7426) radius 1 projected
  circle A44 centre (51.0823, 13.5) radius 1 projected
  circle A45 centre (52.8396, 9.2574) radius 1 projected
  circle A46 centre (57.0823, 7.5) radius 1 projected
  circle A47 centre (-6.8958, 20.7093) radius 0.8
  circle A48 centre (-7.9939, 16.6112) radius 0.8
  circle A49 centre (0.5061, 1.8888) radius 0.8
  circle A50 centre (5.5061, 2) radius 0.8
  circle A51 centre (25.3406, 3) radius 0.8
  circle A52 centre (20.5464, 9.7679) radius 0.8
  circle A53 centre (10.1981, 15.7425) radius 0.8
  point P0 (0, 0)
  dimension "d42" = 1.6
extrude "押し出し5" cut sketch "スケッチ5" against normal through all contours A47 | A48 | A49 | A50 | A51 | A52 | A53
sketch "スケッチ6" plane through (-6, 0, 0) normal (-1, 0, 0) x (0, 0, 1)
  circle A0 centre (-43.7419, 10.3938) radius 1 construction
  circle A1 centre (-39.4731, 3) radius 1 construction
  circle A2 centre (-52.1833, 2) radius 1 construction
  circle A3 centre (-43.7419, 10.3938) radius 0.8
  circle A4 centre (-39.4731, 3) radius 0.8
  circle A5 centre (-52.1833, 2) radius 0.8
  point P0 (0, 0)
  dimension "d43" = 1.6
  dimension "d44" = 1.6
  dimension "d45" = 1.6
extrude "押し出し6" cut sketch "スケッチ6" against normal through all
properties part number "leg_upper_middle_right"
